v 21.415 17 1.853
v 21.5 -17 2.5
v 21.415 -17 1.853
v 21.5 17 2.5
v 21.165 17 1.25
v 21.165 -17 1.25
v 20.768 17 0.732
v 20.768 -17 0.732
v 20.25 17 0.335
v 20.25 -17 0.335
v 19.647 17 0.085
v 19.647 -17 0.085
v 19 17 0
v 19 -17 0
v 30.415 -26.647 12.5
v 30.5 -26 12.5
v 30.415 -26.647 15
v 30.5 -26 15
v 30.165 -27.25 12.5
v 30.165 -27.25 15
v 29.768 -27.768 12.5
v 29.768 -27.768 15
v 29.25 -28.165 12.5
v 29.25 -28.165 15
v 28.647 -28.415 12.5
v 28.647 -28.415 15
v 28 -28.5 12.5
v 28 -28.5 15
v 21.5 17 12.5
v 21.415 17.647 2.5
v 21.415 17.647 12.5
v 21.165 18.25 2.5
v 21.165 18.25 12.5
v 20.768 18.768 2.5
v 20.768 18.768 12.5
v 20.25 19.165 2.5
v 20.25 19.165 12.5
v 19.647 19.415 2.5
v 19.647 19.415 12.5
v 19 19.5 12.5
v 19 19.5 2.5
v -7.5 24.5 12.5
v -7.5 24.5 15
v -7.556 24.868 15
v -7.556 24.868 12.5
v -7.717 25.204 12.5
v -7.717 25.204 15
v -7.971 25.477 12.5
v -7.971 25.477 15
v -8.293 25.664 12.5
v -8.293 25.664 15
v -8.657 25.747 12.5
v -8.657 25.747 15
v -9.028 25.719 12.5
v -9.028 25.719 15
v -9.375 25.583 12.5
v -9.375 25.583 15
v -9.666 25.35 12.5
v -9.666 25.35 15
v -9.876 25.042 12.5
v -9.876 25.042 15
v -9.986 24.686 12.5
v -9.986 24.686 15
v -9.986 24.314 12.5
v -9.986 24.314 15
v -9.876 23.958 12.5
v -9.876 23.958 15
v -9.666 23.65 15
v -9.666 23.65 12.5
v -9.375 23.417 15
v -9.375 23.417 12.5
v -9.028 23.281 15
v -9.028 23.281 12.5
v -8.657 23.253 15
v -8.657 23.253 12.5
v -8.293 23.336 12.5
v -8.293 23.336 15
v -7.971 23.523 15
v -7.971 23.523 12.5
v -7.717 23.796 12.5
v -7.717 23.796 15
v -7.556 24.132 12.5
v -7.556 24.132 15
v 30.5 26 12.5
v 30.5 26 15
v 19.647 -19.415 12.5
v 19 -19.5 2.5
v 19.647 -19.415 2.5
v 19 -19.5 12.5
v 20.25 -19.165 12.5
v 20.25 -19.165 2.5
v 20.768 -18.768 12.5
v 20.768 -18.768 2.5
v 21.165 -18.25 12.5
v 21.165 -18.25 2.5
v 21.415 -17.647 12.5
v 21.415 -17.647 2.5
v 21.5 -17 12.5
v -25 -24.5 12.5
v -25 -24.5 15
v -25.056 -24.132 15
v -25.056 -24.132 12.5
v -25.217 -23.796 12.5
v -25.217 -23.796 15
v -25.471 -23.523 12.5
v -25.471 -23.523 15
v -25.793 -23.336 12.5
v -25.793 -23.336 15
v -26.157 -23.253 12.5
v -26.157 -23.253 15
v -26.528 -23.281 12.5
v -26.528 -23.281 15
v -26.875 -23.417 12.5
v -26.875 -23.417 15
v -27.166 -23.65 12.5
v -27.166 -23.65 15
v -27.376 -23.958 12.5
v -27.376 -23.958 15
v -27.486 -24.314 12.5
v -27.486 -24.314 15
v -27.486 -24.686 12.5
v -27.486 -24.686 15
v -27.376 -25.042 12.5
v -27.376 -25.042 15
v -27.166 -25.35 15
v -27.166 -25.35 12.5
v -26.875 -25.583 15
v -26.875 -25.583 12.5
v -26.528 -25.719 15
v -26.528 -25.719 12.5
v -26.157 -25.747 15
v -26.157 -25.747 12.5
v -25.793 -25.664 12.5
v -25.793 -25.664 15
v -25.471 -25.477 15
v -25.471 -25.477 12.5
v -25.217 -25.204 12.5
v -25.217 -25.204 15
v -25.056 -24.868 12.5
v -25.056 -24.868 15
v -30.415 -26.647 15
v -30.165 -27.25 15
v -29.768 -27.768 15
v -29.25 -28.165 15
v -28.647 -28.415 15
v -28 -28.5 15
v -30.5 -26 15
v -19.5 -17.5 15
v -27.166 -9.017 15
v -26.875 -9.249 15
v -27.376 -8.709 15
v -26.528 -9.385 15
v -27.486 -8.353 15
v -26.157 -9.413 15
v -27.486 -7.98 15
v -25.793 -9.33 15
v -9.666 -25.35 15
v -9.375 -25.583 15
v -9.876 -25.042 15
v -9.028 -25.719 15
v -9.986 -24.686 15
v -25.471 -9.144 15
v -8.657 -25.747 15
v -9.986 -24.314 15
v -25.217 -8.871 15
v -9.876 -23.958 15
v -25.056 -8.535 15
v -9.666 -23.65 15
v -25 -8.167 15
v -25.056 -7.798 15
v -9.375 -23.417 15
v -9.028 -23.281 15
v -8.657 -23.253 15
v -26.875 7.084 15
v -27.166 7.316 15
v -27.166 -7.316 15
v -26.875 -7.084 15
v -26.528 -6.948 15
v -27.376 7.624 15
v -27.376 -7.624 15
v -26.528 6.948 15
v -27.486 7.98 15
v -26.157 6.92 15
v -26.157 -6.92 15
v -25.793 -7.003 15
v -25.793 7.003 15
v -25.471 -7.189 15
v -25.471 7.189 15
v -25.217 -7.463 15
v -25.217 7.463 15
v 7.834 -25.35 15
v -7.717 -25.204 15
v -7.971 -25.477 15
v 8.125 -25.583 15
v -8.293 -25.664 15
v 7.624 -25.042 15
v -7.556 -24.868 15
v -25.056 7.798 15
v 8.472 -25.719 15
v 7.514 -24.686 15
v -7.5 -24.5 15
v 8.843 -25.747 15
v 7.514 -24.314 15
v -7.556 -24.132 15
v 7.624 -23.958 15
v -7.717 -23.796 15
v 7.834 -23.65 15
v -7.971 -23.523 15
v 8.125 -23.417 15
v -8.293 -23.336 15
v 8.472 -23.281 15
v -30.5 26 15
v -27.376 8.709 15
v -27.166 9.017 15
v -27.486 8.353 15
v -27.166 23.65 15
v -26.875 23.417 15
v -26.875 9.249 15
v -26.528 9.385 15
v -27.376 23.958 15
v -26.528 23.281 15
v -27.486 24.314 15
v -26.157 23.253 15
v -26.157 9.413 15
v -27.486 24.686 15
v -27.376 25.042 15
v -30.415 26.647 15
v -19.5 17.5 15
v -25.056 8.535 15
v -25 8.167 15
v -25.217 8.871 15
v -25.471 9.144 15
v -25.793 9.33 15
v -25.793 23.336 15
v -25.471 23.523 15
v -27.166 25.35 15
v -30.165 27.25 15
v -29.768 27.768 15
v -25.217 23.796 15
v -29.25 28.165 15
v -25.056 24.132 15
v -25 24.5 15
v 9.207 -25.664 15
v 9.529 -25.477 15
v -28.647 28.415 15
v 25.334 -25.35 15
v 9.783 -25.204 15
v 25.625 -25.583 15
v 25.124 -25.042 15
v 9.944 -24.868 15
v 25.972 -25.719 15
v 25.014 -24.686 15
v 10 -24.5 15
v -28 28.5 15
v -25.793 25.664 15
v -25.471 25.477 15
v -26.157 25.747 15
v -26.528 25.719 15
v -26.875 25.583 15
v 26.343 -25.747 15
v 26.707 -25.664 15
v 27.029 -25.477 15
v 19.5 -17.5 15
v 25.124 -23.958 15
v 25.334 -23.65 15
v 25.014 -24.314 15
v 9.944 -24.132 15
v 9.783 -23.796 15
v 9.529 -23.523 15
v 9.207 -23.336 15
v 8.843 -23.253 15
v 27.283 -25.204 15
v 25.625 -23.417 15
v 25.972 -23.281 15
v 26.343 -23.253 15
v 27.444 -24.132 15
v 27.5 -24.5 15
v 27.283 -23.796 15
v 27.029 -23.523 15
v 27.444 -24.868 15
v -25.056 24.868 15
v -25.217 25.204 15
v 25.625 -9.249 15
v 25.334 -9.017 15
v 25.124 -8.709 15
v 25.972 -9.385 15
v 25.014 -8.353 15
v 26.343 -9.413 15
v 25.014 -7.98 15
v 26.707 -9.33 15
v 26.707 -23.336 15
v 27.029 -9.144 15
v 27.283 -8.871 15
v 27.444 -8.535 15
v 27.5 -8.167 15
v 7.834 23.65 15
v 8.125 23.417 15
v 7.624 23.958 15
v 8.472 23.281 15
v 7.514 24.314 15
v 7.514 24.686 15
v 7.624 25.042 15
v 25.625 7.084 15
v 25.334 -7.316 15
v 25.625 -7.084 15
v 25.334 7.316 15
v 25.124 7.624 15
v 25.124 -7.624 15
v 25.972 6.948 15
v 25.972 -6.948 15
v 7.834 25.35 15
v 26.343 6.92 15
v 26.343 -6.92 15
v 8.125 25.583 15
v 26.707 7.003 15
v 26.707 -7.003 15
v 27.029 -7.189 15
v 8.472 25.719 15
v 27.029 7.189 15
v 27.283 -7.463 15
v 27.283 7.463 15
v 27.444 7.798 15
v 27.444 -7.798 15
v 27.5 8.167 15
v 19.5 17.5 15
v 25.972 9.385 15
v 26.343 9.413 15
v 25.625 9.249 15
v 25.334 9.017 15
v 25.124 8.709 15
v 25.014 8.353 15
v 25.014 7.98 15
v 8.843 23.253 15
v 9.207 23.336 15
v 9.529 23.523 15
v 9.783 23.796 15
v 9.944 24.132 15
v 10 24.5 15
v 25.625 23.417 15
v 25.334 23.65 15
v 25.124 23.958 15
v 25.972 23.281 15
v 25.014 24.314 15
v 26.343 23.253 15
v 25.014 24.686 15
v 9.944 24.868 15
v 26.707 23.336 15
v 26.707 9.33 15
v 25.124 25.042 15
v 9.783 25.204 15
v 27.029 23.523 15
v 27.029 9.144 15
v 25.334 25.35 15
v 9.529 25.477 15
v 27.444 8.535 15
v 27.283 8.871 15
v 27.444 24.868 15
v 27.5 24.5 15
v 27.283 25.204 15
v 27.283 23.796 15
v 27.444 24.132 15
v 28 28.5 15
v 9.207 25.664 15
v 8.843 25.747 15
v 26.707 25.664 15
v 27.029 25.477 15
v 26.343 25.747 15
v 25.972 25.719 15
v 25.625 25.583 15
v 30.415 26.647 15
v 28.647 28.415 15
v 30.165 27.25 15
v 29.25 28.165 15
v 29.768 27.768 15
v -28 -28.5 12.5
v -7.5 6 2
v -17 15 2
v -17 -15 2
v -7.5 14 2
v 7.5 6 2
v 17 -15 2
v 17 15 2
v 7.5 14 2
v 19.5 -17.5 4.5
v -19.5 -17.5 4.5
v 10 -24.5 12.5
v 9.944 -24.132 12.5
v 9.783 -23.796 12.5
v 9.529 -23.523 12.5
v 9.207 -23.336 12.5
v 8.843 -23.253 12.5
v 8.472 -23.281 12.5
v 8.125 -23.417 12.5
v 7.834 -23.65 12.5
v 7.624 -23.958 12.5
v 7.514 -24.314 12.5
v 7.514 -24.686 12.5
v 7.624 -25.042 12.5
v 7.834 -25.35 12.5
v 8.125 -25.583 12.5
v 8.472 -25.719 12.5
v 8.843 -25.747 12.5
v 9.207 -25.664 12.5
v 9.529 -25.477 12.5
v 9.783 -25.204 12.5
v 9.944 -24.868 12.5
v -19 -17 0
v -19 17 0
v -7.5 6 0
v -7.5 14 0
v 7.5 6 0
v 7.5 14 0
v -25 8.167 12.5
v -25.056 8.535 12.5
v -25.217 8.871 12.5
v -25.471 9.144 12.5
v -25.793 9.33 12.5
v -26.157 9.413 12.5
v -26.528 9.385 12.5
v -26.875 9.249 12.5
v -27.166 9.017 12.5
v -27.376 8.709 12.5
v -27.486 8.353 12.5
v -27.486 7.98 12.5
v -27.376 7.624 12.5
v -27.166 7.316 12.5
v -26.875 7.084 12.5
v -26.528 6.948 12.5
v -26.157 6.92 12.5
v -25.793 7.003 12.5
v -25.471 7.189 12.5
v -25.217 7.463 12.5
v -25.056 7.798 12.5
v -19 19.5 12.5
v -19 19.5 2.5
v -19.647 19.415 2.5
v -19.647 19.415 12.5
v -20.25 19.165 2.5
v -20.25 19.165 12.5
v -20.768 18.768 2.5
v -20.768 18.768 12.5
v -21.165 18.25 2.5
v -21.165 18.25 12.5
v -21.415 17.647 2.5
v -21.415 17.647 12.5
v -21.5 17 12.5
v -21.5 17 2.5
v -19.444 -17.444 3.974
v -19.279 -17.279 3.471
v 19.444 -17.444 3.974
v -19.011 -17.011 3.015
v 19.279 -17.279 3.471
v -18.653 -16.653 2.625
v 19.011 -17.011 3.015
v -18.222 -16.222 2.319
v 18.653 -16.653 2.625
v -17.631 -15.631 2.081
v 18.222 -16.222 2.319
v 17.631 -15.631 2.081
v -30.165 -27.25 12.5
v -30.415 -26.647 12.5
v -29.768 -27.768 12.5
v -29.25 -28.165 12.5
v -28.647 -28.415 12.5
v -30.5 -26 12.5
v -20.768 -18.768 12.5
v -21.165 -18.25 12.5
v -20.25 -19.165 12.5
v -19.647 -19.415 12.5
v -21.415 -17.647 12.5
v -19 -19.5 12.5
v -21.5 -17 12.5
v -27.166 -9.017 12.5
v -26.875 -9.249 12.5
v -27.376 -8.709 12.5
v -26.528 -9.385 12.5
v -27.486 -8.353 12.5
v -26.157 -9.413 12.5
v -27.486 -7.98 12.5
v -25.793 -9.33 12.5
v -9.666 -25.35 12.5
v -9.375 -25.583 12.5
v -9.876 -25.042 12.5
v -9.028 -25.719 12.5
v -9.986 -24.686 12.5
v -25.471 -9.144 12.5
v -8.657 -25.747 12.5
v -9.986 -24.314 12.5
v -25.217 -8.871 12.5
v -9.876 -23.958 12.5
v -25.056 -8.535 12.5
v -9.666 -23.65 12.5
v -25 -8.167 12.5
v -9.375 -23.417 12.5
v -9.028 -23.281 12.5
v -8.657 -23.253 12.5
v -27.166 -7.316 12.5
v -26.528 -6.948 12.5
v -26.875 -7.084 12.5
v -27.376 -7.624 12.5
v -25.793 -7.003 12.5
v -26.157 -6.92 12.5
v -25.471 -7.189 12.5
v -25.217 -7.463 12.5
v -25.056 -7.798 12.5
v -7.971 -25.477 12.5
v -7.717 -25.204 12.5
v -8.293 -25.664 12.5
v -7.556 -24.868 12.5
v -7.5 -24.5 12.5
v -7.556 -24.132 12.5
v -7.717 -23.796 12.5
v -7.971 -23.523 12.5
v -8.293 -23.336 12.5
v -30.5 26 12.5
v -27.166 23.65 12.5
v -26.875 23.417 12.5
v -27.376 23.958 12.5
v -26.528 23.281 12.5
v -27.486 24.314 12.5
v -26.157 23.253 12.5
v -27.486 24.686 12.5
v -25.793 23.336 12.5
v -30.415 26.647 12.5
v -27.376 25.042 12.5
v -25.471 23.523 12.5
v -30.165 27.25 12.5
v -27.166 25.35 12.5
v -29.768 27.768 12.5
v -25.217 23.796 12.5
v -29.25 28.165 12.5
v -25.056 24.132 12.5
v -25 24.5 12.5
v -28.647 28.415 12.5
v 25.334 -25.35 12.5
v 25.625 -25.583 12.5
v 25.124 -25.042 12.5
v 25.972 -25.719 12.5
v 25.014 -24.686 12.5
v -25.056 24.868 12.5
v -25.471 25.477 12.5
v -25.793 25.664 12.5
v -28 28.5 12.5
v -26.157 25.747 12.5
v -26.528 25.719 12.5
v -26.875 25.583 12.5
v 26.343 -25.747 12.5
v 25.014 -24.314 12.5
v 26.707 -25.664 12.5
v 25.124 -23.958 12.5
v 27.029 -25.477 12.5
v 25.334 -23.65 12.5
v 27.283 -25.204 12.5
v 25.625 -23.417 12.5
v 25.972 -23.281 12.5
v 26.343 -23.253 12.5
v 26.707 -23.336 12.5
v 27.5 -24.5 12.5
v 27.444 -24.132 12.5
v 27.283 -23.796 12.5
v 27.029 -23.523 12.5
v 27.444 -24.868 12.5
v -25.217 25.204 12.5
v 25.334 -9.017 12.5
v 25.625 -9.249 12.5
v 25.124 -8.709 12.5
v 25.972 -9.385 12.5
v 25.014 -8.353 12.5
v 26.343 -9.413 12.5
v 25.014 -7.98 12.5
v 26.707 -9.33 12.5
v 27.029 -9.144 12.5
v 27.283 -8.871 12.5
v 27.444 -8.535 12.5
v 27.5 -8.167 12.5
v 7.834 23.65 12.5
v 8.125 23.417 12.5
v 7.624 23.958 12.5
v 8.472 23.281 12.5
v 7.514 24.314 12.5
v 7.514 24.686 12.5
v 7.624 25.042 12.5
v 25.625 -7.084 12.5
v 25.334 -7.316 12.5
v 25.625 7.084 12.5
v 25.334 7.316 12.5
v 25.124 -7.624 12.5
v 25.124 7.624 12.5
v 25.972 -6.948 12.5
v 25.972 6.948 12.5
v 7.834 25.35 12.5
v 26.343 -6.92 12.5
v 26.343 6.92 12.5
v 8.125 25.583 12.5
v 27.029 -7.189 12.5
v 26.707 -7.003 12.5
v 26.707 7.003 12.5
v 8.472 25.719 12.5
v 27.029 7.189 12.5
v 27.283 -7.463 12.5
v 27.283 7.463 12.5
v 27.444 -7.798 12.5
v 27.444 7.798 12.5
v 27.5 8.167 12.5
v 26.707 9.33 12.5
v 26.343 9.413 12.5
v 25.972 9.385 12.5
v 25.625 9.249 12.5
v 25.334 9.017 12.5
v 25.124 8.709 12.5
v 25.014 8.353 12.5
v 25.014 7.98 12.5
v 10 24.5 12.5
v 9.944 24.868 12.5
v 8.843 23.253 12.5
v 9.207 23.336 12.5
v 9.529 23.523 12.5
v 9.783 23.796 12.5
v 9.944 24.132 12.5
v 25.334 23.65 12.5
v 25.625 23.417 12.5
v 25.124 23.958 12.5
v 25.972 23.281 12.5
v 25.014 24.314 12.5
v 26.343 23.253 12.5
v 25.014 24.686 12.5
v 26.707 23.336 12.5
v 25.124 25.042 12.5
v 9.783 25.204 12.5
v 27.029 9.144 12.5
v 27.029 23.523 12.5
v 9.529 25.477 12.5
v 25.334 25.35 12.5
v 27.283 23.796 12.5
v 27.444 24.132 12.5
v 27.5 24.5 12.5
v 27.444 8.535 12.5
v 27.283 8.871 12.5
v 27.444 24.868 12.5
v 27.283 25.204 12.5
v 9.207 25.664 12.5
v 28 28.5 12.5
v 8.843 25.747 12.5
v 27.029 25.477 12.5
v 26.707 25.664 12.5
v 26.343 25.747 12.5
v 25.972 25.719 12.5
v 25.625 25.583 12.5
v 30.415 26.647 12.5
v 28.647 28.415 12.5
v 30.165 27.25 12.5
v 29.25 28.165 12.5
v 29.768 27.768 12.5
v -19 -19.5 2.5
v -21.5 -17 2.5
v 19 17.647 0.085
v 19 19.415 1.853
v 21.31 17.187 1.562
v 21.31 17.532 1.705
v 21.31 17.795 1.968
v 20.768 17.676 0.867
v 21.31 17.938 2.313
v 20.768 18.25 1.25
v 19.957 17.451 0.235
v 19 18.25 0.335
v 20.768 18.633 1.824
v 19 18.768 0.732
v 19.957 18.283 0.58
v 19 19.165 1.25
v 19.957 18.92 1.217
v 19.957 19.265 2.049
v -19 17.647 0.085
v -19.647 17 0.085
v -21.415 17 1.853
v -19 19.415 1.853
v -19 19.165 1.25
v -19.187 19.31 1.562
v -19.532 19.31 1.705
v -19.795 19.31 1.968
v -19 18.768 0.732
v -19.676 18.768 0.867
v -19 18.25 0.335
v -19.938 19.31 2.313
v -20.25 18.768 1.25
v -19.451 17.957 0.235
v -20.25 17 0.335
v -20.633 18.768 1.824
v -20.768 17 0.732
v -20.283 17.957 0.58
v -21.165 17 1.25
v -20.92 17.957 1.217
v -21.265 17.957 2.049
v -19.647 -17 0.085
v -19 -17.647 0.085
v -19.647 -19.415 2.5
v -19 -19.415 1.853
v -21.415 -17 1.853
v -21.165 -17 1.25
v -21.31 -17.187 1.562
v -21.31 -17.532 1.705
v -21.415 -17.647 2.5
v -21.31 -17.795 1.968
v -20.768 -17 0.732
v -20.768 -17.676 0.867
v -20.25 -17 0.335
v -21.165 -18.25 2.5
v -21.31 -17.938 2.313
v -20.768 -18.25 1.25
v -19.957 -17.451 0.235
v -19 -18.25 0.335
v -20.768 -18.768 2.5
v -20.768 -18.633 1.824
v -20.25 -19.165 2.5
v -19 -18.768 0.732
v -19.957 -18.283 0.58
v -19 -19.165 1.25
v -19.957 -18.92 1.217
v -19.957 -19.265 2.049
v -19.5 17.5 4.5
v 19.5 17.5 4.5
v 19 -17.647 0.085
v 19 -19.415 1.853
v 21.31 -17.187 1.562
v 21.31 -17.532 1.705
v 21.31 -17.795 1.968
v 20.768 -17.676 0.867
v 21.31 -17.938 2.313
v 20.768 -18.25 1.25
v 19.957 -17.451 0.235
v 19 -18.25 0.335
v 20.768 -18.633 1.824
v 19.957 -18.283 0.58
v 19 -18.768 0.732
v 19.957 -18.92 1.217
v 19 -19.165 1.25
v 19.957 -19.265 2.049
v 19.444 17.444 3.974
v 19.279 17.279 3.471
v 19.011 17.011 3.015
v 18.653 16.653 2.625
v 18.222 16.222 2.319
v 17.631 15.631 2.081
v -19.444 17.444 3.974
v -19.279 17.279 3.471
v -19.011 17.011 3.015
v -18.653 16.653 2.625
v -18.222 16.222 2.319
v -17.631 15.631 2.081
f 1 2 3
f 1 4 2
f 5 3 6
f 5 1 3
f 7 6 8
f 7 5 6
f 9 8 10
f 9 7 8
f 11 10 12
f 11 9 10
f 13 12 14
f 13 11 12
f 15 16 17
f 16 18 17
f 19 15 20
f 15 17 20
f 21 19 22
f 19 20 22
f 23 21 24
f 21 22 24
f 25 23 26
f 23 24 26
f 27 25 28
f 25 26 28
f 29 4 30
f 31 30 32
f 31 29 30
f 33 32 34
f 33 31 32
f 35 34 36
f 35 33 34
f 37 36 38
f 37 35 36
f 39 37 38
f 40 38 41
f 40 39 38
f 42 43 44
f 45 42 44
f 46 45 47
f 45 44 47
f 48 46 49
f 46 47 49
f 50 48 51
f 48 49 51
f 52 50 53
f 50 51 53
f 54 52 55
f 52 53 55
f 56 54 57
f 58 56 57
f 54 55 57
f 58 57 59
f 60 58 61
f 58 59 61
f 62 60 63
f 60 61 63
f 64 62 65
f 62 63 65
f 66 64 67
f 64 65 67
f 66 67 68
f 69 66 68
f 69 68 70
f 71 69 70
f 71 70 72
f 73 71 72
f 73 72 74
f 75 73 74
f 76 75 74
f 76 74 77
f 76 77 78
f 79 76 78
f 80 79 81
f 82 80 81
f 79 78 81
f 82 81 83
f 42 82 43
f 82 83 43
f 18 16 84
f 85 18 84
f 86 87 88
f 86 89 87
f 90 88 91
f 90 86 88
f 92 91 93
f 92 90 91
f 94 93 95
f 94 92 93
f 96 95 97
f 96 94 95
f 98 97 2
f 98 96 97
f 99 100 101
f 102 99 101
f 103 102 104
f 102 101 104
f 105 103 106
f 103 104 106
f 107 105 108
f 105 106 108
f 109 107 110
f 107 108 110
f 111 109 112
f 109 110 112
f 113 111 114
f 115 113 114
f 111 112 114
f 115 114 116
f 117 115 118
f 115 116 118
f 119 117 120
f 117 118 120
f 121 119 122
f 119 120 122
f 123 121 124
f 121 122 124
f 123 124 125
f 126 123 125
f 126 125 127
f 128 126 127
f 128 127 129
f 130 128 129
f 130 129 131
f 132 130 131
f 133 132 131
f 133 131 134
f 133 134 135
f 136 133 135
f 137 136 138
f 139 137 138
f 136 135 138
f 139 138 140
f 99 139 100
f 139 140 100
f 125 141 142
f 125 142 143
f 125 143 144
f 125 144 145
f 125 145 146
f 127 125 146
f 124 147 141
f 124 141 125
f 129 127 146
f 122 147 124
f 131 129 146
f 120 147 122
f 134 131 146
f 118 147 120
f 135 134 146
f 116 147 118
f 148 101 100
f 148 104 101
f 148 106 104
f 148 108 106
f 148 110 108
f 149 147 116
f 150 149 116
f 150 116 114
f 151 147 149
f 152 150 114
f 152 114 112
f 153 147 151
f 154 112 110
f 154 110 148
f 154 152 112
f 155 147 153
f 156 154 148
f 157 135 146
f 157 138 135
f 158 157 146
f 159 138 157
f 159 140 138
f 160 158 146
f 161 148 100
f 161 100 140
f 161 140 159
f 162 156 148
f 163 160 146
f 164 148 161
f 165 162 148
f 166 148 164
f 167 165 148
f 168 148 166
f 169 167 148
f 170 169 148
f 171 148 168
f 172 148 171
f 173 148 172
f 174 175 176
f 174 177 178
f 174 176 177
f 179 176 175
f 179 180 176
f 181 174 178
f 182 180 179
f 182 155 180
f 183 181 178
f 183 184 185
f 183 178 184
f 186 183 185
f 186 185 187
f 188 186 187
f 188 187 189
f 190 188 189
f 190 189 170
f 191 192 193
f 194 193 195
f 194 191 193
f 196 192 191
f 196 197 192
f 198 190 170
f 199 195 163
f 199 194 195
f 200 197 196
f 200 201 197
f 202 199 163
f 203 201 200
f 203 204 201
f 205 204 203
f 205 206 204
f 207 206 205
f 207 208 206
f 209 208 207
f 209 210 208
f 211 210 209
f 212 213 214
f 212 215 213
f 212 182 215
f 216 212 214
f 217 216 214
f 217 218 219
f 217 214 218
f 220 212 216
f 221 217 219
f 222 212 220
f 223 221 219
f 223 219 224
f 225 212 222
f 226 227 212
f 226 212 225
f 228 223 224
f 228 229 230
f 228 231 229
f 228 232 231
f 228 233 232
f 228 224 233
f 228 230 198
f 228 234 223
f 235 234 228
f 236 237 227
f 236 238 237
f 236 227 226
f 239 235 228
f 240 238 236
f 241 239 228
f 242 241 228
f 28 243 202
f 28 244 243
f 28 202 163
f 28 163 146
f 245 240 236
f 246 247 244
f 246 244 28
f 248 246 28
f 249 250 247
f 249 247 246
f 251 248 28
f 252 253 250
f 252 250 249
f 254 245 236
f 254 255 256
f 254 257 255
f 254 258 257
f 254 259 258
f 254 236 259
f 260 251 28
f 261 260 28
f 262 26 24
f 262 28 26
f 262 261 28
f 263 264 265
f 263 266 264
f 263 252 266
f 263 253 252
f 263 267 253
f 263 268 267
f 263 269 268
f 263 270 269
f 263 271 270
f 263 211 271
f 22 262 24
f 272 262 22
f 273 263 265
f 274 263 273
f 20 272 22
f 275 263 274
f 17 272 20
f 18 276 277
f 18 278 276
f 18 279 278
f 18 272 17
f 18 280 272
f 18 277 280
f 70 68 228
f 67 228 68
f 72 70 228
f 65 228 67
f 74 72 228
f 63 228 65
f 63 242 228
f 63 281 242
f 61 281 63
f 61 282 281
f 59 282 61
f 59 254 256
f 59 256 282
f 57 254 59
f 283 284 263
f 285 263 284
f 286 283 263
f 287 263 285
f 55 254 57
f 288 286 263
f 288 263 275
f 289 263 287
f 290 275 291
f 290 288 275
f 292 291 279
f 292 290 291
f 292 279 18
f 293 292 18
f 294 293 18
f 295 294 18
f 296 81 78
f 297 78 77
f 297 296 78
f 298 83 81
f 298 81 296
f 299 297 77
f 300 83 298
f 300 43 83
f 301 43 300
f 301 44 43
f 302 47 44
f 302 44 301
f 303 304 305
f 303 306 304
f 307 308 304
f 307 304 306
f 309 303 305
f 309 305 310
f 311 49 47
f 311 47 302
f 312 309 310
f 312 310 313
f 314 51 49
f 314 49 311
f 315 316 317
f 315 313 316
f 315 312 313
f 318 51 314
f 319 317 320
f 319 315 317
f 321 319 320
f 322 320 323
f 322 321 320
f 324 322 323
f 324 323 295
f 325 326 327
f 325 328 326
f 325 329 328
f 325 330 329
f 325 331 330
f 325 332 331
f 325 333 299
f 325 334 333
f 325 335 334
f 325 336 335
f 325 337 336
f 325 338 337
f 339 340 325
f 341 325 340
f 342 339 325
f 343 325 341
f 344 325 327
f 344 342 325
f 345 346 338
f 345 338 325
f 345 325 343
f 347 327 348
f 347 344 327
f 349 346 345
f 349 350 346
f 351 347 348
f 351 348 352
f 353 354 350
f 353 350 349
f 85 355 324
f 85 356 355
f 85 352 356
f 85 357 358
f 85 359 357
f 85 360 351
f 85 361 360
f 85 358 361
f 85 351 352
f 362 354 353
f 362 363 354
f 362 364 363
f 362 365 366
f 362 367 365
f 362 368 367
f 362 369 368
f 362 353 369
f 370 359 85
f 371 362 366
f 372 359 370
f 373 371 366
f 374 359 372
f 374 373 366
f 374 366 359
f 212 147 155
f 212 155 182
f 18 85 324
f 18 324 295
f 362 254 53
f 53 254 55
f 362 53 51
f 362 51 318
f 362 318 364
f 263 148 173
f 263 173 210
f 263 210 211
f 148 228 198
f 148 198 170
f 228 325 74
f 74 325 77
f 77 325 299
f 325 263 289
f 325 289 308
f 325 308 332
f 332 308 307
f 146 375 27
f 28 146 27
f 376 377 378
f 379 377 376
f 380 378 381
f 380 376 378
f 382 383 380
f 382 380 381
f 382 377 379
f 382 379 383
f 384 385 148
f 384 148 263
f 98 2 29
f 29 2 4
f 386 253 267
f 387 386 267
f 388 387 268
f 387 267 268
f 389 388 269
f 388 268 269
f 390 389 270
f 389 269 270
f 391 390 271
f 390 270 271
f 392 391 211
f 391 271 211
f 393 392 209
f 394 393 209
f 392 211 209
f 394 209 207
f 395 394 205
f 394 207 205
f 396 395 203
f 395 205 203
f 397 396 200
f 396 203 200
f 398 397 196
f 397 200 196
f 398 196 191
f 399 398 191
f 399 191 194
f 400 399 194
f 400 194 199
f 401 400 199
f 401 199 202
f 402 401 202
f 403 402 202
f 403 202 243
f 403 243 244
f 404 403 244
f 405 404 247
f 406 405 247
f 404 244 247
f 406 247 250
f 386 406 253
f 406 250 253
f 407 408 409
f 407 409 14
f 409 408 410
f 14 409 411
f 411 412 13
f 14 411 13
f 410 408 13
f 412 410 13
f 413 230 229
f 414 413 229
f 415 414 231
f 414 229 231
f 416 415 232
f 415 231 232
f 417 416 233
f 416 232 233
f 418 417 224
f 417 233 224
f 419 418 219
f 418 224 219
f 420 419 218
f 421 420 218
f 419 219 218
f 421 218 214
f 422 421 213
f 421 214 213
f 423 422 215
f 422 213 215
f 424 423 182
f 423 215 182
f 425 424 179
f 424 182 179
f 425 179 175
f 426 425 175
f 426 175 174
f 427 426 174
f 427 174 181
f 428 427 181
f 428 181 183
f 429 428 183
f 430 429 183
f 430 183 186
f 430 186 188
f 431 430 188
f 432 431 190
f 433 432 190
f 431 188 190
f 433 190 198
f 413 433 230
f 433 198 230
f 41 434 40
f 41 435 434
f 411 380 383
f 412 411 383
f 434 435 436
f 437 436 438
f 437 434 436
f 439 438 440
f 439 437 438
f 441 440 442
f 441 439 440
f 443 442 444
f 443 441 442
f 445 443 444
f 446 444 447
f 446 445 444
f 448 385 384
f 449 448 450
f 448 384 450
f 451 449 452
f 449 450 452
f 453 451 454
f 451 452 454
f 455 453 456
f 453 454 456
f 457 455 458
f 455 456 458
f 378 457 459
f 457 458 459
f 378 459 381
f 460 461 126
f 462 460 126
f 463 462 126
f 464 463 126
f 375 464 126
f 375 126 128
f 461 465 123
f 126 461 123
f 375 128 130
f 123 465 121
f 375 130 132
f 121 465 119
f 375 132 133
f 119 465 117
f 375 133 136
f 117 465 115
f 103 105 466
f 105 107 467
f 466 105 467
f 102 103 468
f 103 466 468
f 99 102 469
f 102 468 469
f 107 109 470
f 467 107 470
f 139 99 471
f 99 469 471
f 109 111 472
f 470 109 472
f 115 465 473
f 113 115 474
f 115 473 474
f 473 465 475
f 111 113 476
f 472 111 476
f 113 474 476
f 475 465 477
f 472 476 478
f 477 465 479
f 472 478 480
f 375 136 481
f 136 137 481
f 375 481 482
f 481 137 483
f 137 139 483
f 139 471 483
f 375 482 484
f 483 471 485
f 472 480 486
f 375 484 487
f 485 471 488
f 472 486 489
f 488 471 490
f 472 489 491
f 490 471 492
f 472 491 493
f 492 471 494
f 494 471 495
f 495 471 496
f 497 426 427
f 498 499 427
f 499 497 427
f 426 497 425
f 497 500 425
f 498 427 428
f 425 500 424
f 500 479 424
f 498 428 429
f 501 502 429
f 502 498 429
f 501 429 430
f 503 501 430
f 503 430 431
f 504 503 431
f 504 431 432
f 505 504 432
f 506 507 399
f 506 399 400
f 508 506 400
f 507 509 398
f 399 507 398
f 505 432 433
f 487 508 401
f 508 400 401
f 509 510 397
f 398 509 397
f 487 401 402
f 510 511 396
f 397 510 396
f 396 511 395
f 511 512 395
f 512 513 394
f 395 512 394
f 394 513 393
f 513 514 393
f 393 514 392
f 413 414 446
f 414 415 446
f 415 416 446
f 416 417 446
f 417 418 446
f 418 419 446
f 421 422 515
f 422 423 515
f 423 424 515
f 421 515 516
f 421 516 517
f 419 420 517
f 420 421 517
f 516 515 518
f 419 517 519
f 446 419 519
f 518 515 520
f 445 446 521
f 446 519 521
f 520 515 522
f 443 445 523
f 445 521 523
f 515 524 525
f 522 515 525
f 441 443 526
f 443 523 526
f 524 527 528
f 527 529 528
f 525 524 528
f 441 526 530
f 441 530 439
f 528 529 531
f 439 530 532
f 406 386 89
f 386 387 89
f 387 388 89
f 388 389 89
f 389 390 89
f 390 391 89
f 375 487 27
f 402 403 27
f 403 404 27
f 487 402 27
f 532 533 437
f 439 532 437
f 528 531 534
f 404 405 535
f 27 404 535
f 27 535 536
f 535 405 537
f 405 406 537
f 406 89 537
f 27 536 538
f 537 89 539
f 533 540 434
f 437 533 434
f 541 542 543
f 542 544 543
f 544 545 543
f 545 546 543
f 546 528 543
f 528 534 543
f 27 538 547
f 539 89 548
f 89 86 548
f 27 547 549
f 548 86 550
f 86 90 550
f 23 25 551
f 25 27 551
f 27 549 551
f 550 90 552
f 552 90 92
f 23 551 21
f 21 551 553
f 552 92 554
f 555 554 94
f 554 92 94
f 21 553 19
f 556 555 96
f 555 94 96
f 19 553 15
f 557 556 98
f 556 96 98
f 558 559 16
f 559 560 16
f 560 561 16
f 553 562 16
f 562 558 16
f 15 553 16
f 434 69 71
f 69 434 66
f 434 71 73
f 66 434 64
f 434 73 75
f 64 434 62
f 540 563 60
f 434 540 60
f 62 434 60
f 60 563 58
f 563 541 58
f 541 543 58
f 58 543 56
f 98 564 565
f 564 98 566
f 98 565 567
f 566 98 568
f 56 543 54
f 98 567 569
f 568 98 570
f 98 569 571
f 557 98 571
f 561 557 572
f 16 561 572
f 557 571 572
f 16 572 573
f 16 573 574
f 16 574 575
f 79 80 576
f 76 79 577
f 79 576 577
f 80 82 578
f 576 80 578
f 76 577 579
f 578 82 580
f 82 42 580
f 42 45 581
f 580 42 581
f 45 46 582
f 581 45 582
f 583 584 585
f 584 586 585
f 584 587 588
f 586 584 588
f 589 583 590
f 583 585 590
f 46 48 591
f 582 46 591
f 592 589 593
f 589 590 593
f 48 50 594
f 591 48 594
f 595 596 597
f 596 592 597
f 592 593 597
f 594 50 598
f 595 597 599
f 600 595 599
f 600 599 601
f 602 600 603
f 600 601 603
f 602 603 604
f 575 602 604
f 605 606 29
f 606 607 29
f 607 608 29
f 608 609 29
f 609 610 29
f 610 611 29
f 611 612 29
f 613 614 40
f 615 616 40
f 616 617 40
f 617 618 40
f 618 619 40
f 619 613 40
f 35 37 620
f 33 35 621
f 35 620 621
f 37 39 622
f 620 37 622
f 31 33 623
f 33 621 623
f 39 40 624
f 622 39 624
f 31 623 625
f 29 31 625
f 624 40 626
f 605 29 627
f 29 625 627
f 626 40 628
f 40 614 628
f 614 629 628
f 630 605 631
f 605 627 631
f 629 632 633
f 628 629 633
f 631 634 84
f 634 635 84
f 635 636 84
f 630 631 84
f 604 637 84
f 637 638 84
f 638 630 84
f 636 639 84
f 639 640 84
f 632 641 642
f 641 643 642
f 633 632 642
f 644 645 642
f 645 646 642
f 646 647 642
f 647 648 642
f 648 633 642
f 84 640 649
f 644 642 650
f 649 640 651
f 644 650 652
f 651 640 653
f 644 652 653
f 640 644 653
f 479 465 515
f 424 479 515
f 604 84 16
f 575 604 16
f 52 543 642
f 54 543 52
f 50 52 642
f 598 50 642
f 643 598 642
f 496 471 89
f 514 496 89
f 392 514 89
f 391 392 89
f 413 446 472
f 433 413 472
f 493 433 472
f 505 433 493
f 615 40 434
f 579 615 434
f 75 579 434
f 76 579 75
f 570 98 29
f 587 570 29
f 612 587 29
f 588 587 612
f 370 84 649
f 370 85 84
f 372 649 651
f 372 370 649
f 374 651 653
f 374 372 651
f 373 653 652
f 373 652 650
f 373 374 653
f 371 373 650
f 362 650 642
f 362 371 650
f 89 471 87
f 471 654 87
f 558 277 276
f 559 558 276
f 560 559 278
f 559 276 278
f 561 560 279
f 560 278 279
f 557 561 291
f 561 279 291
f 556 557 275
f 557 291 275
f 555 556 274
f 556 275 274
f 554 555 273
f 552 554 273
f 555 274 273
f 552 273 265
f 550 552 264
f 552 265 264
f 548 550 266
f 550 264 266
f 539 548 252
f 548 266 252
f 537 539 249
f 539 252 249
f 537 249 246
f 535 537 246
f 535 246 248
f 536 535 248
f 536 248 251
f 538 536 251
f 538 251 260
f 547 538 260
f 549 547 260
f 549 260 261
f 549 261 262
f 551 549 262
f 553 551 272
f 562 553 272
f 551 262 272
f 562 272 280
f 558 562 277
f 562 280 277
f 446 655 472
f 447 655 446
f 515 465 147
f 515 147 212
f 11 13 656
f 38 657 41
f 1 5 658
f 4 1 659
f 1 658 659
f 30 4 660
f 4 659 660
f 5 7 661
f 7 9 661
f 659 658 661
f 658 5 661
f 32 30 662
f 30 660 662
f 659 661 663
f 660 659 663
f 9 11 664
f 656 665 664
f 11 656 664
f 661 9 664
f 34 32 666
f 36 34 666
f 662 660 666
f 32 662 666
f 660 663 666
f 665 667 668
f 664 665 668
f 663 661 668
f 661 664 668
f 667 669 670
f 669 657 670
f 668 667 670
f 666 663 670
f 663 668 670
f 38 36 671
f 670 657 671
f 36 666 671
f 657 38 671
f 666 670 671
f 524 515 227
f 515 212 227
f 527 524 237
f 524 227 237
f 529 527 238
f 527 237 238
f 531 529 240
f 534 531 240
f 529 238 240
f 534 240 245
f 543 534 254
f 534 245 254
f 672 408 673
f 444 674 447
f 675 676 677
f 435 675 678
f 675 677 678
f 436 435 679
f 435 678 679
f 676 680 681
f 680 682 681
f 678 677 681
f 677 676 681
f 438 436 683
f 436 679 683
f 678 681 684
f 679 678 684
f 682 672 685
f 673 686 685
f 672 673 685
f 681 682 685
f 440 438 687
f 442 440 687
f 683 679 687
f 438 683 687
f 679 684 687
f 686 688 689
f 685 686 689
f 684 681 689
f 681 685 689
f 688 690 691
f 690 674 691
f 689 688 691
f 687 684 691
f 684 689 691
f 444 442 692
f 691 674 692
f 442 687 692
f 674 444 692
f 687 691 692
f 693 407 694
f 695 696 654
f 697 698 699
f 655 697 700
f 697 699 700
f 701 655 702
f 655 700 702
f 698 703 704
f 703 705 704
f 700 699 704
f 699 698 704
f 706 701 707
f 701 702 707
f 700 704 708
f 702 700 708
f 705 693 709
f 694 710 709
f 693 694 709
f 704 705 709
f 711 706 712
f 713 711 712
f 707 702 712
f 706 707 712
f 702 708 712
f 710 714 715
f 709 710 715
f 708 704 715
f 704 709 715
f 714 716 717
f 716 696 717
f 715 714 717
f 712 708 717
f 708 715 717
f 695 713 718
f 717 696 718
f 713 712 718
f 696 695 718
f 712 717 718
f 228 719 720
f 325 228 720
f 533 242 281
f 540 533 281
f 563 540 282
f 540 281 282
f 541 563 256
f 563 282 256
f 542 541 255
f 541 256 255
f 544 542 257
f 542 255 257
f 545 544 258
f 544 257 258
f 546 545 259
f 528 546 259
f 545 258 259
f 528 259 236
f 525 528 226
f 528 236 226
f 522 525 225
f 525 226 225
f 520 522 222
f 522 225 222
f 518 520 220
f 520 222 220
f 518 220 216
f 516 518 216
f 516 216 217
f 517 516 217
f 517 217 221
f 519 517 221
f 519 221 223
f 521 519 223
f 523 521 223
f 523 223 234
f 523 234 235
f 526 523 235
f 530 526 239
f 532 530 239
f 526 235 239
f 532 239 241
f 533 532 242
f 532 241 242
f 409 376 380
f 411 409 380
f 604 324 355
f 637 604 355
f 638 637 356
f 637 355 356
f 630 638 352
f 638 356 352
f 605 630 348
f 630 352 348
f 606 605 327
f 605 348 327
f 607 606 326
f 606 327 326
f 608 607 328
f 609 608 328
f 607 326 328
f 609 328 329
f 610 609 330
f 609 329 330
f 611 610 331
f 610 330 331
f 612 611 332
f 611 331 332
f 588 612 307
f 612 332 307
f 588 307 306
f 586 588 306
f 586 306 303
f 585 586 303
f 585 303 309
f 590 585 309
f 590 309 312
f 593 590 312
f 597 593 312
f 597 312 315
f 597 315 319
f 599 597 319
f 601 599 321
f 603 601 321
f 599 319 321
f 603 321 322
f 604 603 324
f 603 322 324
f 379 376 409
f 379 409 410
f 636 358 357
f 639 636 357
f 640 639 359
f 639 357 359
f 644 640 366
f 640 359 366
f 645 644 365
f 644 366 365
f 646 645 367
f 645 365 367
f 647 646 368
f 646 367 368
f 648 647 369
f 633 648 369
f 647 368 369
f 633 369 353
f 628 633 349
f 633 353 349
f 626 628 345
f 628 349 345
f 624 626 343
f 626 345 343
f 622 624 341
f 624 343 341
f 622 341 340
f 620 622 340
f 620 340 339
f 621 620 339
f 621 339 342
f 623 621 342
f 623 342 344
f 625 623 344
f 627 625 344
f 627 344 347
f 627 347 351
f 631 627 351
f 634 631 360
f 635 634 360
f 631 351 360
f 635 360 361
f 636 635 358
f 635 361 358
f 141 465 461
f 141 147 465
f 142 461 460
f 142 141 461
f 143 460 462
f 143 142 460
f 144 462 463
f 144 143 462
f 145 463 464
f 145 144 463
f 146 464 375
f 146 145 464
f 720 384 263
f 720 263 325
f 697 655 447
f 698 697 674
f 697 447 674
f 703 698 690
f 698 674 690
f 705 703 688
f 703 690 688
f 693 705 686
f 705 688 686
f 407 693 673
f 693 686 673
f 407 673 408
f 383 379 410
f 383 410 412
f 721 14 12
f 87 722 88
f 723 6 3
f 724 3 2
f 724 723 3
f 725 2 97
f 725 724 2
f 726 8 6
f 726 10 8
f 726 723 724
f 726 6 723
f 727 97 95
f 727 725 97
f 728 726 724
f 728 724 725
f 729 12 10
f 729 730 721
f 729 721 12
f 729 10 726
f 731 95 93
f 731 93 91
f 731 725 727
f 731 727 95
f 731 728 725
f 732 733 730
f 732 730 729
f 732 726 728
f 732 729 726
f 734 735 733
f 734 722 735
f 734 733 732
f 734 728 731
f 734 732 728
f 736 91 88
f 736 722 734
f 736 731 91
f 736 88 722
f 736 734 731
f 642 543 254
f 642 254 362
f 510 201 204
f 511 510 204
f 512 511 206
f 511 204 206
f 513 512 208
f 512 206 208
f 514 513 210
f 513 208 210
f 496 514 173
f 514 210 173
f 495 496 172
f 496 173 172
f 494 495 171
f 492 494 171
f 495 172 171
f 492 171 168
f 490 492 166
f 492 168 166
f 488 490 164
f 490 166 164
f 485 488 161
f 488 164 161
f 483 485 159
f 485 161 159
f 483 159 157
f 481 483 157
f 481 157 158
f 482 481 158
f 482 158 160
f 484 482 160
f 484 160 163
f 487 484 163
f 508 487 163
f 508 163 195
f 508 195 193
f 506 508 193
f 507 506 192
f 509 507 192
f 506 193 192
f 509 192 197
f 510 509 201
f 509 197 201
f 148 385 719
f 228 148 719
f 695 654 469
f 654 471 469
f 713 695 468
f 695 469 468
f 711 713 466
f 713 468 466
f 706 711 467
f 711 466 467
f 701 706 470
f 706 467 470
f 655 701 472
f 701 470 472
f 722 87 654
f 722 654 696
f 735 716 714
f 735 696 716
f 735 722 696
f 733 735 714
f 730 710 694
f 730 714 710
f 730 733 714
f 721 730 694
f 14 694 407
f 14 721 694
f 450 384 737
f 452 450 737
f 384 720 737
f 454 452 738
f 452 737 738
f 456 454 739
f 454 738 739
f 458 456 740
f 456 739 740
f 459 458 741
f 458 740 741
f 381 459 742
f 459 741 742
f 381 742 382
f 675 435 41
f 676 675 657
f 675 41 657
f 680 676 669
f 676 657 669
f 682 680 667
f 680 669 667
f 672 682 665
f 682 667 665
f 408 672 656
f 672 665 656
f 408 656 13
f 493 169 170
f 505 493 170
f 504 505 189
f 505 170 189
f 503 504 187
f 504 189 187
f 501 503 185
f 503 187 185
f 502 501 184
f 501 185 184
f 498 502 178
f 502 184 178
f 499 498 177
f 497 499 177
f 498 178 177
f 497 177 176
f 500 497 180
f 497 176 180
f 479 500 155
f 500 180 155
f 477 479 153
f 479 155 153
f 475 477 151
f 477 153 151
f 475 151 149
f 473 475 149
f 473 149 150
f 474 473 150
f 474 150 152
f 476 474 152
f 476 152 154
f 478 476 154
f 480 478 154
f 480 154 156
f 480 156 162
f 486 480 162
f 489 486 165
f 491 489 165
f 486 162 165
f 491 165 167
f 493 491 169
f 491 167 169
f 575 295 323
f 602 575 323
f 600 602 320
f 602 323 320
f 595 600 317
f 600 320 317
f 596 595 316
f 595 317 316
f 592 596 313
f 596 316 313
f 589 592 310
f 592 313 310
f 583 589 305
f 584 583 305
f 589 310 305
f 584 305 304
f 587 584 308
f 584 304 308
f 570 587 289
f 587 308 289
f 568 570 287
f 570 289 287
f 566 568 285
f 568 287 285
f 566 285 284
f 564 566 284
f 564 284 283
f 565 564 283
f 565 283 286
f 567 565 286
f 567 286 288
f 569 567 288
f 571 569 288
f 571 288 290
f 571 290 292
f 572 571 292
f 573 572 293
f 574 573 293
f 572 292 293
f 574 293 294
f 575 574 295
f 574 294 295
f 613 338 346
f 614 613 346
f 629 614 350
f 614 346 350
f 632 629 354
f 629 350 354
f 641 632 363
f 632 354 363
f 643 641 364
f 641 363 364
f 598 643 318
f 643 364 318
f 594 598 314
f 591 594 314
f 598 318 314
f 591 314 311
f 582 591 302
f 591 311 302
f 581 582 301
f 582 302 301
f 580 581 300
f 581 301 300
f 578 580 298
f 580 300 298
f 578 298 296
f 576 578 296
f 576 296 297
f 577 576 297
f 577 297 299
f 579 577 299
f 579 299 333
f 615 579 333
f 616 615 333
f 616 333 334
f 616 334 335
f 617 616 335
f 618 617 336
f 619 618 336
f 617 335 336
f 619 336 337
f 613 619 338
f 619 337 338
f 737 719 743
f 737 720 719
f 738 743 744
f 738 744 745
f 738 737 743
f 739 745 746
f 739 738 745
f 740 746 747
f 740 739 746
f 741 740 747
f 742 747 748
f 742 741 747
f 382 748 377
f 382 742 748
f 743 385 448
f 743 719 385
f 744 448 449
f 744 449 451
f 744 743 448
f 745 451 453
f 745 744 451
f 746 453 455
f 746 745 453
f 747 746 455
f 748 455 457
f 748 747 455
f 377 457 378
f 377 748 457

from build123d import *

# Parameters (mm, degrees)
SKETCH1_W           = 43
SKETCH1_H           = 39
BOSS_EXTRUDE1_DEPTH = 12.5
SHELL1_T            = -2
SKETCH2_W           = 61
SKETCH2_H           = 57
SKETCH2_W_2         = 39
SKETCH2_H_2         = 35
BOSS_EXTRUDE2_DEPTH = 2.5
FILLET1_R           = 2.5
FILLET2_R           = 2.5
SKETCH3_W           = 15
SKETCH3_H           = 8
CUT_EXTRUDE1_DEPTH  = 44.720704477
SKETCH4_R           = 1.25
CUT_EXTRUDE2_DEPTH  = 2.5


with BuildPart() as part:
    # Sketch1 → Boss-Extrude1 (new body)
    with BuildSketch(Plane.XY):
        Rectangle(SKETCH1_W, SKETCH1_H)
    extrude(amount=BOSS_EXTRUDE1_DEPTH)

    # Shell1
    shell1_openings = [part.faces().sort_by_distance(p)[0] for p in [
        (0, 0, 12.5),
    ]]
    offset(amount=SHELL1_T, openings=shell1_openings, kind=Kind.INTERSECTION)

    # Sketch2 → Boss-Extrude2 (add)
    with BuildSketch(Plane.XY.offset(12.5)):
        Rectangle(SKETCH2_W, SKETCH2_H)
        Rectangle(SKETCH2_W_2, SKETCH2_H_2, mode=Mode.SUBTRACT)
    extrude(amount=BOSS_EXTRUDE2_DEPTH)

    # Fillet1
    fillet1_edges = [part.edges().sort_by_distance(p)[0] for p in [
        (30.5, -28.5, 13.75),
        (30.5, 28.5, 13.75),
        (-30.5, 28.5, 13.75),
        (-30.5, -28.5, 13.75),
    ]]
    fillet(fillet1_edges, radius=FILLET1_R)

    # Fillet2
    fillet2_edges = [part.edges().sort_by_distance(p)[0] for p in [
        (19.5, 0, 2),
        (0, 17.5, 2),
        (-19.5, 0, 2),
        (0, -17.5, 2),
        (0, -19.5, 0),
        (-21.5, 0, 0),
        (0, 19.5, 0),
        (21.5, 0, 0),
        (21.5, -19.5, 6.25),
        (-21.5, -19.5, 6.25),
        (-21.5, 19.5, 6.25),
        (21.5, 19.5, 6.25),
    ]]
    fillet(fillet2_edges, radius=FILLET2_R)

    # Sketch3 → Cut-Extrude1 (cut, through all)
    with BuildSketch(Plane.XY.offset(2)):
        with Locations((0, 10)):
            Rectangle(SKETCH3_W, SKETCH3_H)
    extrude(amount=-CUT_EXTRUDE1_DEPTH, mode=Mode.SUBTRACT)

    # Sketch4 → Cut-Extrude2 (cut)
    with BuildSketch(Plane.XY.offset(15)):
        with Locations((-26.25, 24.5)):
            Circle(SKETCH4_R)
        with Locations((-8.75, 24.5)):
            Circle(SKETCH4_R)
        with Locations((8.75, 24.5)):
            Circle(SKETCH4_R)
        with Locations((26.25, 24.5)):
            Circle(SKETCH4_R)
        with Locations((26.25, 8.166666667)):
            Circle(SKETCH4_R)
        with Locations((26.25, -8.166666667)):
            Circle(SKETCH4_R)
        with Locations((-8.75, -24.5)):
            Circle(SKETCH4_R)
        with Locations((8.75, -24.5)):
            Circle(SKETCH4_R)
        with Locations((26.25, -24.5)):
            Circle(SKETCH4_R)
        with Locations((-26.25, 8.166666667)):
            Circle(SKETCH4_R)
        with Locations((-26.25, -8.166666667)):
            Circle(SKETCH4_R)
        with Locations((-26.25, -24.5)):
            Circle(SKETCH4_R)
    extrude(amount=-CUT_EXTRUDE2_DEPTH, mode=Mode.SUBTRACT)


solid = part.part
